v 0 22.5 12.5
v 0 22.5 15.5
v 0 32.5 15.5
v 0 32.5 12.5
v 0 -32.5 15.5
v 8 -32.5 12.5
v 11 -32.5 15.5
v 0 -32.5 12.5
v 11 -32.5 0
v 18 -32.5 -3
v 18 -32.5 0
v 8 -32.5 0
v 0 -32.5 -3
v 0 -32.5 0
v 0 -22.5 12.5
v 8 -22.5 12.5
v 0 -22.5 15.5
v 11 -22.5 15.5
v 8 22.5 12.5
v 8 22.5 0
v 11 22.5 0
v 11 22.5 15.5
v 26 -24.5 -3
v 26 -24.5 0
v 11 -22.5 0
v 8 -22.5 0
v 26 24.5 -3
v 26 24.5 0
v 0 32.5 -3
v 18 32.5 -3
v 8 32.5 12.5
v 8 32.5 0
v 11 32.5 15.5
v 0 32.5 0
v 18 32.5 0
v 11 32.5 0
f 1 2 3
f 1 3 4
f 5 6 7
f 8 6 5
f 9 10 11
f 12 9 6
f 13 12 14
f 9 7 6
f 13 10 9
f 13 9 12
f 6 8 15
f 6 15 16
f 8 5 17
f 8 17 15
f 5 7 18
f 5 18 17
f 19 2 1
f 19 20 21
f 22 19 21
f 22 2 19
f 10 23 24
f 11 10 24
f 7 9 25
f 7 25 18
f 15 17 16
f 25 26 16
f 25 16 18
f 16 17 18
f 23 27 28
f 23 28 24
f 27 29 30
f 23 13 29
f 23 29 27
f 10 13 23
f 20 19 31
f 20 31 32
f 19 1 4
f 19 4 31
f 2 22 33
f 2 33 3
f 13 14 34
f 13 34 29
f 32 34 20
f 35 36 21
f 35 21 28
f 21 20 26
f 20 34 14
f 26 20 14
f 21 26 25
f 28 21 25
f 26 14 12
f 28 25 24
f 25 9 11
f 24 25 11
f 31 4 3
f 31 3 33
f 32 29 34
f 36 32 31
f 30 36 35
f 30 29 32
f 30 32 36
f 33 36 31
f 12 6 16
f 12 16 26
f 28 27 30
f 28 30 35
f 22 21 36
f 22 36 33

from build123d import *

# Parameters (mm, degrees)
F1_DEPTH = 32.5
F2_W     = 11
F2_H     = 45
F3_DEPTH = 15.5
F5_DEPTH = 3
F6_SIZE  = 8


with BuildPart() as f1:
    # F0 (on Front) → F1 (new body, symmetric)
    with BuildSketch(Plane.XZ):
        Polygon((8, 0), (0, 0), (0, -3), (11, -3), (11, 15.5), (0, 15.5), (0, 12.5), (8, 12.5), align=None)
    extrude(amount=F1_DEPTH, both=True)

    # F2 (on face) → F3 (cut, through all)
    with BuildSketch(Plane.XY.offset(15.5)):
        with Locations((5.5, 0)):
            Rectangle(F2_W, F2_H)
    extrude(amount=-F3_DEPTH, mode=Mode.SUBTRACT)

    # F4 (on face) → F5 (join, through all)
    with BuildSketch(Plane(origin=(0, 0, -3), x_dir=(1, 0, 0), z_dir=(0, 0, -1))):
        Polygon((11, 22.5), (11, -22.5), (11, -32.5), (26, -32.5), (26, 32.5), (11, 32.5), align=None)
    extrude(amount=-F5_DEPTH)

    # F6
    f6_edges = [f1.edges().sort_by_distance(p)[0] for p in [
        (26, -32.5, -1.5),
        (26, 32.5, -1.5),
    ]]
    chamfer(f6_edges, length=F6_SIZE)


solid = f1.part
